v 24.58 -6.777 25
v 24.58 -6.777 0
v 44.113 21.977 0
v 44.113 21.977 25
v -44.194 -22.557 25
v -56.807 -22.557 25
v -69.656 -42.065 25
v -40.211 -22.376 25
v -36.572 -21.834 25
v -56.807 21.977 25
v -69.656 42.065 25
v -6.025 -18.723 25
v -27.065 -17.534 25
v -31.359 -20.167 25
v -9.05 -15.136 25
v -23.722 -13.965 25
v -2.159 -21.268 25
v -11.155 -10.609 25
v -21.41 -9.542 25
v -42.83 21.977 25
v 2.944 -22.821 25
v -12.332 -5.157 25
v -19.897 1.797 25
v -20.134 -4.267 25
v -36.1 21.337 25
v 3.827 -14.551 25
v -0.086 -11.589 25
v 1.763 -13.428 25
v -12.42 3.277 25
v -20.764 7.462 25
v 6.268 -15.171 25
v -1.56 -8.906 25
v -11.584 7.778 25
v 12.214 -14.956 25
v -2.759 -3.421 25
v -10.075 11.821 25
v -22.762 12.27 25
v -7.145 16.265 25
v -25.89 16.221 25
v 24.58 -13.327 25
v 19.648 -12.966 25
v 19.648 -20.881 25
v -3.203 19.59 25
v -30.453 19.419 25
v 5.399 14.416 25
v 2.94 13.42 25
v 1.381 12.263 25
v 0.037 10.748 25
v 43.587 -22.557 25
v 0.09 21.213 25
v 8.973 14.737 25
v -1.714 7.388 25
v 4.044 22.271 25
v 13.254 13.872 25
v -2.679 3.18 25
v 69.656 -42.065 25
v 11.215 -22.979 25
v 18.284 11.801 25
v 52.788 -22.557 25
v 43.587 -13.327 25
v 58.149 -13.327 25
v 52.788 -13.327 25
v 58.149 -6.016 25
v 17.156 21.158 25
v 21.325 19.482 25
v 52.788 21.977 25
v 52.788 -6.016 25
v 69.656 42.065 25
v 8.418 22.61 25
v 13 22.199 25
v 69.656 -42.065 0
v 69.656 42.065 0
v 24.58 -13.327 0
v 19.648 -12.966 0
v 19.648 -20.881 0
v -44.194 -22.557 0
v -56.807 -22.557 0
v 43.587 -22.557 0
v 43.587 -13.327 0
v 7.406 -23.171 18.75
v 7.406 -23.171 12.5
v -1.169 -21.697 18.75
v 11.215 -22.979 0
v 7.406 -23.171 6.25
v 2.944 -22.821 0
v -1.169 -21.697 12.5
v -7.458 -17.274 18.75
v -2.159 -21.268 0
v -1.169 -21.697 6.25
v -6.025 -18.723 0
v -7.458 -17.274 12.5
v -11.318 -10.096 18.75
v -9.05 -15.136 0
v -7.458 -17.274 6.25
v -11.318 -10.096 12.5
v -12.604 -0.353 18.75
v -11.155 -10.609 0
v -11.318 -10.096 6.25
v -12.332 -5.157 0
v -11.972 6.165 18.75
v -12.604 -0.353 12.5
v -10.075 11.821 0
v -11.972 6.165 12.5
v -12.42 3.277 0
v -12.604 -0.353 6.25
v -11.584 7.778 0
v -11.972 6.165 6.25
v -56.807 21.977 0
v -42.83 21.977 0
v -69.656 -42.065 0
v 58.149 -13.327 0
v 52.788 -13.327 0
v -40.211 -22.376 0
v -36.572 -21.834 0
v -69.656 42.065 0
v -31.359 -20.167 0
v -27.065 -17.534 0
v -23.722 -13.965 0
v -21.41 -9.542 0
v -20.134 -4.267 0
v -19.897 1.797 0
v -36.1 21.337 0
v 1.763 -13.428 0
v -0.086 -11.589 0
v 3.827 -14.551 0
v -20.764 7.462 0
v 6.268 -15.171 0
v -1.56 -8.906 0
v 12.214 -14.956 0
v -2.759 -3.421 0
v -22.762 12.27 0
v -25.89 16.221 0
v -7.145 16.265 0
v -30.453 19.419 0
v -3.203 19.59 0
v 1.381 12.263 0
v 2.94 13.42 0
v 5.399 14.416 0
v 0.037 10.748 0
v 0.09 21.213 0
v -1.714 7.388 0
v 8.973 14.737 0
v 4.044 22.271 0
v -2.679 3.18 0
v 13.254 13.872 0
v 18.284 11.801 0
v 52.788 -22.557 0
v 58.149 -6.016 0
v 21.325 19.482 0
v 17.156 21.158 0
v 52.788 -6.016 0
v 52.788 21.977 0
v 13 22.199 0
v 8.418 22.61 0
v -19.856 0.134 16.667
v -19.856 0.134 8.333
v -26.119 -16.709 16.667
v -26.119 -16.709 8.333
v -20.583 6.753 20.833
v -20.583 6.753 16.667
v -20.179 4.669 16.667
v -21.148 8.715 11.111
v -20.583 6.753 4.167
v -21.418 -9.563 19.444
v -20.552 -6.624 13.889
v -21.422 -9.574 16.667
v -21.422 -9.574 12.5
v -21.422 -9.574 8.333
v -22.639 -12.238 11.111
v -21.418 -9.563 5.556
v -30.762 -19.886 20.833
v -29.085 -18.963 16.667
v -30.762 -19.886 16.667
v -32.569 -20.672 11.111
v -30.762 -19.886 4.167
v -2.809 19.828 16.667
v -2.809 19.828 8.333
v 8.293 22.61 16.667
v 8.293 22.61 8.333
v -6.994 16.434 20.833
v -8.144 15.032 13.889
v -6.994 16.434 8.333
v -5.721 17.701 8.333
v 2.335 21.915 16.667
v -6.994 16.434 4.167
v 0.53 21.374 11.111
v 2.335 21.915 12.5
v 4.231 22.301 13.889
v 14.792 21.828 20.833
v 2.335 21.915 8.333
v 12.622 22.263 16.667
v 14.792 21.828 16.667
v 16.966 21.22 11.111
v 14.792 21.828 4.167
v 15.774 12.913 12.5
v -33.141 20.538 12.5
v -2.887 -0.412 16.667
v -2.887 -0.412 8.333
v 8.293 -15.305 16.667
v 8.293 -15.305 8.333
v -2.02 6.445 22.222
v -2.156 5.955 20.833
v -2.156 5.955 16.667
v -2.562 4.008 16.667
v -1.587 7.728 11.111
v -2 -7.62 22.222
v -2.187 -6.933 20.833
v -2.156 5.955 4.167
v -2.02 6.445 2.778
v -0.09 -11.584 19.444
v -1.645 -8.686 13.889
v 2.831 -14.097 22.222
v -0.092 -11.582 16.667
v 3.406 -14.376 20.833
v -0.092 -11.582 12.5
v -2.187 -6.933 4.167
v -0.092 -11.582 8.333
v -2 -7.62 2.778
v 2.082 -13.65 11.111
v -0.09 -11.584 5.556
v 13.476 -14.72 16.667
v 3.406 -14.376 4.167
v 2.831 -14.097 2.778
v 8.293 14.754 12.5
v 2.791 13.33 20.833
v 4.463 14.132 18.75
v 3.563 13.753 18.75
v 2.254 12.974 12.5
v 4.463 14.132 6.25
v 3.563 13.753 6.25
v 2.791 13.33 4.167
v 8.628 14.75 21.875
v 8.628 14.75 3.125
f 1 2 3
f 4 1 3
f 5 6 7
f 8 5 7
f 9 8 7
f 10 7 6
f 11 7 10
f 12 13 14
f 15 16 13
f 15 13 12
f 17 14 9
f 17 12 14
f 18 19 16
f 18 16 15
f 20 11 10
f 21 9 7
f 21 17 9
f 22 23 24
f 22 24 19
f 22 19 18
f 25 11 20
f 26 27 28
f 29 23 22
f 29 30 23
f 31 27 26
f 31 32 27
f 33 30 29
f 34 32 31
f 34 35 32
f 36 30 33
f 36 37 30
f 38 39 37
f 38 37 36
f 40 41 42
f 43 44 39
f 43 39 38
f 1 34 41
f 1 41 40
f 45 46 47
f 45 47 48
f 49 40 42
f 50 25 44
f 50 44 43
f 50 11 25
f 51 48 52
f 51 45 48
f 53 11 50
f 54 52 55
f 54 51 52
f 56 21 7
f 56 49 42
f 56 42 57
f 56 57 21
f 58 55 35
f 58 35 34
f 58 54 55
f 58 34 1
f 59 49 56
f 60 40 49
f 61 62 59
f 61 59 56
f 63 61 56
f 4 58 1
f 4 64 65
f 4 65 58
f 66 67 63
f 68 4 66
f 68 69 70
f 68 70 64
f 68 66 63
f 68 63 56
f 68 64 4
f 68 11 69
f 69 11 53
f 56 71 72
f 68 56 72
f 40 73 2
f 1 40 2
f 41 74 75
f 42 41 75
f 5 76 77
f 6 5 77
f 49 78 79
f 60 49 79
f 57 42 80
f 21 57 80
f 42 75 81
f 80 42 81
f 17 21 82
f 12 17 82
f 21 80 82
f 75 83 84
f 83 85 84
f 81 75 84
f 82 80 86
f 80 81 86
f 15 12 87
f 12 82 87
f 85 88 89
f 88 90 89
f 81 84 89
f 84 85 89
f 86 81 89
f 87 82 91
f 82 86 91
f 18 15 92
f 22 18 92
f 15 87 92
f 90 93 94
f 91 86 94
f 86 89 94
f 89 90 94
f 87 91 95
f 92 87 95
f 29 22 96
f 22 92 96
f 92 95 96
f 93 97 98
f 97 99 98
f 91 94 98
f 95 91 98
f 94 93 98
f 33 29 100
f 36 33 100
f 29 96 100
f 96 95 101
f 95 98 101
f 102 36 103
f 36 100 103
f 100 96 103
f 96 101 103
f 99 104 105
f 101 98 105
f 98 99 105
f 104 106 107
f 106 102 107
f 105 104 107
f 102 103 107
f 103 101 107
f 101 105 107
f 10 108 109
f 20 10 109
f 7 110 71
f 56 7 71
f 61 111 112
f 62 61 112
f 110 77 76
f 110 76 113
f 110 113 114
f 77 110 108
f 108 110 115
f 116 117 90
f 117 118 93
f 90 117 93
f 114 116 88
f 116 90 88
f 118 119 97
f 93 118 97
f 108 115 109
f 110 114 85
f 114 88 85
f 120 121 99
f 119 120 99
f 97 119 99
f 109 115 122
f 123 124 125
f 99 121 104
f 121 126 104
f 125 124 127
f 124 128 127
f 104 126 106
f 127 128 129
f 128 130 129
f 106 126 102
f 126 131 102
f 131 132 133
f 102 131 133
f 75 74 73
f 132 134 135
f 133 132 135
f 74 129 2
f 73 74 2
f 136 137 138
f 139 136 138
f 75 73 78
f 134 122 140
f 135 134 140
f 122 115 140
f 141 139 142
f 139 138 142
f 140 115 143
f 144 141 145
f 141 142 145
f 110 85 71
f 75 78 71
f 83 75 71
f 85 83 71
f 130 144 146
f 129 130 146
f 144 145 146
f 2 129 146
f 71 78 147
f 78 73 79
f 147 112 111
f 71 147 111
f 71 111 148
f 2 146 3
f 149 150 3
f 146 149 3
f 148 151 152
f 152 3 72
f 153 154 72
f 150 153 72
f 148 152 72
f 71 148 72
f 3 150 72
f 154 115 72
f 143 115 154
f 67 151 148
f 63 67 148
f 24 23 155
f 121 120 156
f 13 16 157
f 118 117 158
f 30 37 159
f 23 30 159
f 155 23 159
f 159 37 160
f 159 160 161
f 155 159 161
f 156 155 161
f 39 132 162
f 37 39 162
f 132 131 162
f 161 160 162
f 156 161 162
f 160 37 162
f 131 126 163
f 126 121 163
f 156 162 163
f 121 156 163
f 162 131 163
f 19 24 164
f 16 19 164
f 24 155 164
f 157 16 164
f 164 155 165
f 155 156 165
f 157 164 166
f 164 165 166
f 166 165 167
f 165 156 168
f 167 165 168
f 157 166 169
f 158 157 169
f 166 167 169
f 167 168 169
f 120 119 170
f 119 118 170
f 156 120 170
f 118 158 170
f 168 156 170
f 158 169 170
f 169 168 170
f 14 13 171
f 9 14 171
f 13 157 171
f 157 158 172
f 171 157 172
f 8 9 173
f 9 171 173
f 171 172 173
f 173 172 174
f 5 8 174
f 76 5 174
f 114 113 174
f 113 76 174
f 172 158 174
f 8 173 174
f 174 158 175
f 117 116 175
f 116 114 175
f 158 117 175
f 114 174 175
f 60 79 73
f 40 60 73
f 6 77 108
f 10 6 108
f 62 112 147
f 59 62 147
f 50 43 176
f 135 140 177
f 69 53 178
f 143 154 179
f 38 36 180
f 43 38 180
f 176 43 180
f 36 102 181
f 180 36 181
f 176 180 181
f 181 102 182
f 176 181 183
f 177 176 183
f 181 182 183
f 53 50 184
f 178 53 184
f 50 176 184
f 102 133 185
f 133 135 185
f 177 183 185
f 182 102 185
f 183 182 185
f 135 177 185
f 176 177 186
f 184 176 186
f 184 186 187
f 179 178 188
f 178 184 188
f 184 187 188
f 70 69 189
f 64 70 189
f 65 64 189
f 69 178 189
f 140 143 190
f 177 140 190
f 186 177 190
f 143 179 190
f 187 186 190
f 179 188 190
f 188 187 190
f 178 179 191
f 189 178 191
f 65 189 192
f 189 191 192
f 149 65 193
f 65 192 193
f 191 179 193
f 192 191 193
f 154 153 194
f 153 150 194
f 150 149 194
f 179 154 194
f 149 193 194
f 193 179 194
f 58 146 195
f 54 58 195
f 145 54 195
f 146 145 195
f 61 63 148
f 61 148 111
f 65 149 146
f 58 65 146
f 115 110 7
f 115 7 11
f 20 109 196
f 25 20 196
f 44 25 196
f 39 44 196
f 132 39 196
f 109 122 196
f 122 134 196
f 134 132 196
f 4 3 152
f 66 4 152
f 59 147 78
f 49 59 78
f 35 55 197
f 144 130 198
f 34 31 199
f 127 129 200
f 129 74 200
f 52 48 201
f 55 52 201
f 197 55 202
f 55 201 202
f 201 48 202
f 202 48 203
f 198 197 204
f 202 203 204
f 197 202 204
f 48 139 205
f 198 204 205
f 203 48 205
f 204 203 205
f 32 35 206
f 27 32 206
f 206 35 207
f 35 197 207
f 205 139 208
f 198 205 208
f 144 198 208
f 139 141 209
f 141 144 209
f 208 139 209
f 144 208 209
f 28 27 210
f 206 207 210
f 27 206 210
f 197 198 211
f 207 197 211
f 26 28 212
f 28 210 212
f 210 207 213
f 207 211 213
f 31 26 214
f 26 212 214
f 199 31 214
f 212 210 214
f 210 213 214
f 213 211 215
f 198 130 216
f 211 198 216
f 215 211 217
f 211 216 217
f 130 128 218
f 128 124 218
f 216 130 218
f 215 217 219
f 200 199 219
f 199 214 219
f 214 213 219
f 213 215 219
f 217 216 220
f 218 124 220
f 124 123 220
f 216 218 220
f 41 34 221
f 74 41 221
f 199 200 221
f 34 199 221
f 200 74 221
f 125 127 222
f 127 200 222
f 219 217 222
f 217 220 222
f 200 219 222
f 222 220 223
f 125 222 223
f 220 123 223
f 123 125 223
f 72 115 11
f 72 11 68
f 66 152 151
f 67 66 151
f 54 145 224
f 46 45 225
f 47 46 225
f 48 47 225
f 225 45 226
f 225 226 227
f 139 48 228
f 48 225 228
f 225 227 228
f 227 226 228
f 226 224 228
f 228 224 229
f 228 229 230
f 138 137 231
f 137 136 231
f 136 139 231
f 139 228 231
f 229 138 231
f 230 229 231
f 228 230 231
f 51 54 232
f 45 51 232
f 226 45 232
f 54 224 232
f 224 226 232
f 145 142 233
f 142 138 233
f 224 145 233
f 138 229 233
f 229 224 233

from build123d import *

# Parameters (mm, degrees)
F0_W     = 139.312
F0_H     = 84.13
F1_DEPTH = 25


with BuildPart() as f1:
    # F0 (on Top) → F1 (new body)
    with BuildSketch(Plane.XY):
        Rectangle(F0_W, F0_H)
        with BuildLine():
            add(Edge.make_bspline(
                [(-25.8895429555, 16.2212613242), (-19.8561711311, 10.4656780249), (-19.8561711311, 0.1338942869)],
                knots=[0, 0, 0, 1, 1, 1], degree=2))
            add(Edge.make_bspline(
                [(-19.8561711311, 0.1338942869), (-19.8561711311, -10.8606831248), (-26.1185966515, -16.7088625991)],
                knots=[0, 0, 0, 1, 1, 1], degree=2))
            add(Edge.make_bspline(
                [(-26.1185966515, -16.7088625991), (-32.381022172, -22.5570420735), (-44.1943447101, -22.5570420735)],
                knots=[0, 0, 0, 1, 1, 1], degree=2))
            Line((-44.1943447101, -22.5570420735), (-56.806918443, -22.5570420735))
            Line((-56.806918443, -22.5570420735), (-56.806918443, 21.9768446235))
            Line((-56.806918443, 21.9768446235), (-42.8297694994, 21.9768446235))
            add(Edge.make_bspline(
                [(-42.8297694994, 21.9768446235), (-31.9229147798, 21.9768446235), (-25.8895429555, 16.2212613242)],
                knots=[0, 0, 0, 1, 1, 1], degree=2))
        make_face(mode=Mode.SUBTRACT)
        with BuildLine():
            add(Edge.make_bspline(
                [(13.2542716593, 13.8722425686), (10.7298075196, 14.7543429727), (8.2930660719, 14.7543429727)],
                knots=[0, 0, 0, 1, 1, 1], degree=2))
            add(Edge.make_bspline(
                [(8.2930660719, 14.7543429727), (2.9614757845, 14.7543429727), (0.0373860474, 10.7483400328)],
                knots=[0, 0, 0, 1, 1, 1], degree=2))
            add(Edge.make_bspline(
                [(0.0373860474, 10.7483400328), (-2.8867036898, 6.7423370929), (-2.8867036898, -0.4119357974)],
                knots=[0, 0, 0, 1, 1, 1], degree=2))
            add(Edge.make_bspline(
                [(-2.8867036898, -0.4119357974), (-2.8867036898, -15.3052995253), (8.2930660719, -15.3052995253)],
                knots=[0, 0, 0, 1, 1, 1], degree=2))
            add(Edge.make_bspline(
                [(8.2930660719, -15.3052995253), (12.9813566172, -15.3052995253), (19.6482812179, -12.9660277356)],
                knots=[0, 0, 0, 1, 1, 1], degree=2))
            Line((19.6482812179, -12.9660277356), (19.6482812179, -20.8805639575))
            add(Edge.make_bspline(
                [(19.6482812179, -20.8805639575), (14.1704864436, -23.1711009183), (7.406092185, -23.1711009183)],
                knots=[0, 0, 0, 1, 1, 1], degree=2))
            add(Edge.make_bspline(
                [(7.406092185, -23.1711009183), (-2.3116327082, -23.1711009183), (-7.4580306456, -17.274186615)],
                knots=[0, 0, 0, 1, 1, 1], degree=2))
            add(Edge.make_bspline(
                [(-7.4580306456, -17.274186615), (-12.604428583, -11.3772723117), (-12.604428583, -0.3534540026)],
                knots=[0, 0, 0, 1, 1, 1], degree=2))
            add(Edge.make_bspline(
                [(-12.604428583, -0.3534540026), (-12.604428583, 6.596132606), (-10.0750909603, 11.8205062697)],
                knots=[0, 0, 0, 1, 1, 1], degree=2))
            add(Edge.make_bspline(
                [(-10.0750909603, 11.8205062697), (-7.5457533377, 17.0448799335), (-2.8087279635, 19.8276386667)],
                knots=[0, 0, 0, 1, 1, 1], degree=2))
            add(Edge.make_bspline(
                [(-2.8087279635, 19.8276386667), (1.9282974107, 22.6103973999), (8.2930660719, 22.6103973999)],
                knots=[0, 0, 0, 1, 1, 1], degree=2))
            add(Edge.make_bspline(
                [(8.2930660719, 22.6103973999), (14.7747983226, 22.6103973999), (21.3247593339, 19.4816213811)],
                knots=[0, 0, 0, 1, 1, 1], degree=2))
            Line((21.3247593339, 19.4816213811), (18.2837060072, 11.8010123382))
            add(Edge.make_bspline(
                [(18.2837060072, 11.8010123382), (15.7787357991, 12.9901421646), (13.2542716593, 13.8722425686)],
                knots=[0, 0, 0, 1, 1, 1], degree=2))
        make_face(mode=Mode.SUBTRACT)
        Polygon((58.1487960905, -6.0164411269), (58.1487960905, -13.3266654698), (52.7879649057, -13.3266654698), (52.7879649057, -22.5570420735), (43.5868291994, -22.5570420735), (43.5868291994, -13.3266654698), (24.5802459079, -13.3266654698), (24.5802459079, -6.7767044586), (44.1131653521, 21.9768446235), (52.7879649057, 21.9768446235), (52.7879649057, -6.0164411269), align=None, mode=Mode.SUBTRACT)
    extrude(amount=F1_DEPTH)


solid = f1.part
